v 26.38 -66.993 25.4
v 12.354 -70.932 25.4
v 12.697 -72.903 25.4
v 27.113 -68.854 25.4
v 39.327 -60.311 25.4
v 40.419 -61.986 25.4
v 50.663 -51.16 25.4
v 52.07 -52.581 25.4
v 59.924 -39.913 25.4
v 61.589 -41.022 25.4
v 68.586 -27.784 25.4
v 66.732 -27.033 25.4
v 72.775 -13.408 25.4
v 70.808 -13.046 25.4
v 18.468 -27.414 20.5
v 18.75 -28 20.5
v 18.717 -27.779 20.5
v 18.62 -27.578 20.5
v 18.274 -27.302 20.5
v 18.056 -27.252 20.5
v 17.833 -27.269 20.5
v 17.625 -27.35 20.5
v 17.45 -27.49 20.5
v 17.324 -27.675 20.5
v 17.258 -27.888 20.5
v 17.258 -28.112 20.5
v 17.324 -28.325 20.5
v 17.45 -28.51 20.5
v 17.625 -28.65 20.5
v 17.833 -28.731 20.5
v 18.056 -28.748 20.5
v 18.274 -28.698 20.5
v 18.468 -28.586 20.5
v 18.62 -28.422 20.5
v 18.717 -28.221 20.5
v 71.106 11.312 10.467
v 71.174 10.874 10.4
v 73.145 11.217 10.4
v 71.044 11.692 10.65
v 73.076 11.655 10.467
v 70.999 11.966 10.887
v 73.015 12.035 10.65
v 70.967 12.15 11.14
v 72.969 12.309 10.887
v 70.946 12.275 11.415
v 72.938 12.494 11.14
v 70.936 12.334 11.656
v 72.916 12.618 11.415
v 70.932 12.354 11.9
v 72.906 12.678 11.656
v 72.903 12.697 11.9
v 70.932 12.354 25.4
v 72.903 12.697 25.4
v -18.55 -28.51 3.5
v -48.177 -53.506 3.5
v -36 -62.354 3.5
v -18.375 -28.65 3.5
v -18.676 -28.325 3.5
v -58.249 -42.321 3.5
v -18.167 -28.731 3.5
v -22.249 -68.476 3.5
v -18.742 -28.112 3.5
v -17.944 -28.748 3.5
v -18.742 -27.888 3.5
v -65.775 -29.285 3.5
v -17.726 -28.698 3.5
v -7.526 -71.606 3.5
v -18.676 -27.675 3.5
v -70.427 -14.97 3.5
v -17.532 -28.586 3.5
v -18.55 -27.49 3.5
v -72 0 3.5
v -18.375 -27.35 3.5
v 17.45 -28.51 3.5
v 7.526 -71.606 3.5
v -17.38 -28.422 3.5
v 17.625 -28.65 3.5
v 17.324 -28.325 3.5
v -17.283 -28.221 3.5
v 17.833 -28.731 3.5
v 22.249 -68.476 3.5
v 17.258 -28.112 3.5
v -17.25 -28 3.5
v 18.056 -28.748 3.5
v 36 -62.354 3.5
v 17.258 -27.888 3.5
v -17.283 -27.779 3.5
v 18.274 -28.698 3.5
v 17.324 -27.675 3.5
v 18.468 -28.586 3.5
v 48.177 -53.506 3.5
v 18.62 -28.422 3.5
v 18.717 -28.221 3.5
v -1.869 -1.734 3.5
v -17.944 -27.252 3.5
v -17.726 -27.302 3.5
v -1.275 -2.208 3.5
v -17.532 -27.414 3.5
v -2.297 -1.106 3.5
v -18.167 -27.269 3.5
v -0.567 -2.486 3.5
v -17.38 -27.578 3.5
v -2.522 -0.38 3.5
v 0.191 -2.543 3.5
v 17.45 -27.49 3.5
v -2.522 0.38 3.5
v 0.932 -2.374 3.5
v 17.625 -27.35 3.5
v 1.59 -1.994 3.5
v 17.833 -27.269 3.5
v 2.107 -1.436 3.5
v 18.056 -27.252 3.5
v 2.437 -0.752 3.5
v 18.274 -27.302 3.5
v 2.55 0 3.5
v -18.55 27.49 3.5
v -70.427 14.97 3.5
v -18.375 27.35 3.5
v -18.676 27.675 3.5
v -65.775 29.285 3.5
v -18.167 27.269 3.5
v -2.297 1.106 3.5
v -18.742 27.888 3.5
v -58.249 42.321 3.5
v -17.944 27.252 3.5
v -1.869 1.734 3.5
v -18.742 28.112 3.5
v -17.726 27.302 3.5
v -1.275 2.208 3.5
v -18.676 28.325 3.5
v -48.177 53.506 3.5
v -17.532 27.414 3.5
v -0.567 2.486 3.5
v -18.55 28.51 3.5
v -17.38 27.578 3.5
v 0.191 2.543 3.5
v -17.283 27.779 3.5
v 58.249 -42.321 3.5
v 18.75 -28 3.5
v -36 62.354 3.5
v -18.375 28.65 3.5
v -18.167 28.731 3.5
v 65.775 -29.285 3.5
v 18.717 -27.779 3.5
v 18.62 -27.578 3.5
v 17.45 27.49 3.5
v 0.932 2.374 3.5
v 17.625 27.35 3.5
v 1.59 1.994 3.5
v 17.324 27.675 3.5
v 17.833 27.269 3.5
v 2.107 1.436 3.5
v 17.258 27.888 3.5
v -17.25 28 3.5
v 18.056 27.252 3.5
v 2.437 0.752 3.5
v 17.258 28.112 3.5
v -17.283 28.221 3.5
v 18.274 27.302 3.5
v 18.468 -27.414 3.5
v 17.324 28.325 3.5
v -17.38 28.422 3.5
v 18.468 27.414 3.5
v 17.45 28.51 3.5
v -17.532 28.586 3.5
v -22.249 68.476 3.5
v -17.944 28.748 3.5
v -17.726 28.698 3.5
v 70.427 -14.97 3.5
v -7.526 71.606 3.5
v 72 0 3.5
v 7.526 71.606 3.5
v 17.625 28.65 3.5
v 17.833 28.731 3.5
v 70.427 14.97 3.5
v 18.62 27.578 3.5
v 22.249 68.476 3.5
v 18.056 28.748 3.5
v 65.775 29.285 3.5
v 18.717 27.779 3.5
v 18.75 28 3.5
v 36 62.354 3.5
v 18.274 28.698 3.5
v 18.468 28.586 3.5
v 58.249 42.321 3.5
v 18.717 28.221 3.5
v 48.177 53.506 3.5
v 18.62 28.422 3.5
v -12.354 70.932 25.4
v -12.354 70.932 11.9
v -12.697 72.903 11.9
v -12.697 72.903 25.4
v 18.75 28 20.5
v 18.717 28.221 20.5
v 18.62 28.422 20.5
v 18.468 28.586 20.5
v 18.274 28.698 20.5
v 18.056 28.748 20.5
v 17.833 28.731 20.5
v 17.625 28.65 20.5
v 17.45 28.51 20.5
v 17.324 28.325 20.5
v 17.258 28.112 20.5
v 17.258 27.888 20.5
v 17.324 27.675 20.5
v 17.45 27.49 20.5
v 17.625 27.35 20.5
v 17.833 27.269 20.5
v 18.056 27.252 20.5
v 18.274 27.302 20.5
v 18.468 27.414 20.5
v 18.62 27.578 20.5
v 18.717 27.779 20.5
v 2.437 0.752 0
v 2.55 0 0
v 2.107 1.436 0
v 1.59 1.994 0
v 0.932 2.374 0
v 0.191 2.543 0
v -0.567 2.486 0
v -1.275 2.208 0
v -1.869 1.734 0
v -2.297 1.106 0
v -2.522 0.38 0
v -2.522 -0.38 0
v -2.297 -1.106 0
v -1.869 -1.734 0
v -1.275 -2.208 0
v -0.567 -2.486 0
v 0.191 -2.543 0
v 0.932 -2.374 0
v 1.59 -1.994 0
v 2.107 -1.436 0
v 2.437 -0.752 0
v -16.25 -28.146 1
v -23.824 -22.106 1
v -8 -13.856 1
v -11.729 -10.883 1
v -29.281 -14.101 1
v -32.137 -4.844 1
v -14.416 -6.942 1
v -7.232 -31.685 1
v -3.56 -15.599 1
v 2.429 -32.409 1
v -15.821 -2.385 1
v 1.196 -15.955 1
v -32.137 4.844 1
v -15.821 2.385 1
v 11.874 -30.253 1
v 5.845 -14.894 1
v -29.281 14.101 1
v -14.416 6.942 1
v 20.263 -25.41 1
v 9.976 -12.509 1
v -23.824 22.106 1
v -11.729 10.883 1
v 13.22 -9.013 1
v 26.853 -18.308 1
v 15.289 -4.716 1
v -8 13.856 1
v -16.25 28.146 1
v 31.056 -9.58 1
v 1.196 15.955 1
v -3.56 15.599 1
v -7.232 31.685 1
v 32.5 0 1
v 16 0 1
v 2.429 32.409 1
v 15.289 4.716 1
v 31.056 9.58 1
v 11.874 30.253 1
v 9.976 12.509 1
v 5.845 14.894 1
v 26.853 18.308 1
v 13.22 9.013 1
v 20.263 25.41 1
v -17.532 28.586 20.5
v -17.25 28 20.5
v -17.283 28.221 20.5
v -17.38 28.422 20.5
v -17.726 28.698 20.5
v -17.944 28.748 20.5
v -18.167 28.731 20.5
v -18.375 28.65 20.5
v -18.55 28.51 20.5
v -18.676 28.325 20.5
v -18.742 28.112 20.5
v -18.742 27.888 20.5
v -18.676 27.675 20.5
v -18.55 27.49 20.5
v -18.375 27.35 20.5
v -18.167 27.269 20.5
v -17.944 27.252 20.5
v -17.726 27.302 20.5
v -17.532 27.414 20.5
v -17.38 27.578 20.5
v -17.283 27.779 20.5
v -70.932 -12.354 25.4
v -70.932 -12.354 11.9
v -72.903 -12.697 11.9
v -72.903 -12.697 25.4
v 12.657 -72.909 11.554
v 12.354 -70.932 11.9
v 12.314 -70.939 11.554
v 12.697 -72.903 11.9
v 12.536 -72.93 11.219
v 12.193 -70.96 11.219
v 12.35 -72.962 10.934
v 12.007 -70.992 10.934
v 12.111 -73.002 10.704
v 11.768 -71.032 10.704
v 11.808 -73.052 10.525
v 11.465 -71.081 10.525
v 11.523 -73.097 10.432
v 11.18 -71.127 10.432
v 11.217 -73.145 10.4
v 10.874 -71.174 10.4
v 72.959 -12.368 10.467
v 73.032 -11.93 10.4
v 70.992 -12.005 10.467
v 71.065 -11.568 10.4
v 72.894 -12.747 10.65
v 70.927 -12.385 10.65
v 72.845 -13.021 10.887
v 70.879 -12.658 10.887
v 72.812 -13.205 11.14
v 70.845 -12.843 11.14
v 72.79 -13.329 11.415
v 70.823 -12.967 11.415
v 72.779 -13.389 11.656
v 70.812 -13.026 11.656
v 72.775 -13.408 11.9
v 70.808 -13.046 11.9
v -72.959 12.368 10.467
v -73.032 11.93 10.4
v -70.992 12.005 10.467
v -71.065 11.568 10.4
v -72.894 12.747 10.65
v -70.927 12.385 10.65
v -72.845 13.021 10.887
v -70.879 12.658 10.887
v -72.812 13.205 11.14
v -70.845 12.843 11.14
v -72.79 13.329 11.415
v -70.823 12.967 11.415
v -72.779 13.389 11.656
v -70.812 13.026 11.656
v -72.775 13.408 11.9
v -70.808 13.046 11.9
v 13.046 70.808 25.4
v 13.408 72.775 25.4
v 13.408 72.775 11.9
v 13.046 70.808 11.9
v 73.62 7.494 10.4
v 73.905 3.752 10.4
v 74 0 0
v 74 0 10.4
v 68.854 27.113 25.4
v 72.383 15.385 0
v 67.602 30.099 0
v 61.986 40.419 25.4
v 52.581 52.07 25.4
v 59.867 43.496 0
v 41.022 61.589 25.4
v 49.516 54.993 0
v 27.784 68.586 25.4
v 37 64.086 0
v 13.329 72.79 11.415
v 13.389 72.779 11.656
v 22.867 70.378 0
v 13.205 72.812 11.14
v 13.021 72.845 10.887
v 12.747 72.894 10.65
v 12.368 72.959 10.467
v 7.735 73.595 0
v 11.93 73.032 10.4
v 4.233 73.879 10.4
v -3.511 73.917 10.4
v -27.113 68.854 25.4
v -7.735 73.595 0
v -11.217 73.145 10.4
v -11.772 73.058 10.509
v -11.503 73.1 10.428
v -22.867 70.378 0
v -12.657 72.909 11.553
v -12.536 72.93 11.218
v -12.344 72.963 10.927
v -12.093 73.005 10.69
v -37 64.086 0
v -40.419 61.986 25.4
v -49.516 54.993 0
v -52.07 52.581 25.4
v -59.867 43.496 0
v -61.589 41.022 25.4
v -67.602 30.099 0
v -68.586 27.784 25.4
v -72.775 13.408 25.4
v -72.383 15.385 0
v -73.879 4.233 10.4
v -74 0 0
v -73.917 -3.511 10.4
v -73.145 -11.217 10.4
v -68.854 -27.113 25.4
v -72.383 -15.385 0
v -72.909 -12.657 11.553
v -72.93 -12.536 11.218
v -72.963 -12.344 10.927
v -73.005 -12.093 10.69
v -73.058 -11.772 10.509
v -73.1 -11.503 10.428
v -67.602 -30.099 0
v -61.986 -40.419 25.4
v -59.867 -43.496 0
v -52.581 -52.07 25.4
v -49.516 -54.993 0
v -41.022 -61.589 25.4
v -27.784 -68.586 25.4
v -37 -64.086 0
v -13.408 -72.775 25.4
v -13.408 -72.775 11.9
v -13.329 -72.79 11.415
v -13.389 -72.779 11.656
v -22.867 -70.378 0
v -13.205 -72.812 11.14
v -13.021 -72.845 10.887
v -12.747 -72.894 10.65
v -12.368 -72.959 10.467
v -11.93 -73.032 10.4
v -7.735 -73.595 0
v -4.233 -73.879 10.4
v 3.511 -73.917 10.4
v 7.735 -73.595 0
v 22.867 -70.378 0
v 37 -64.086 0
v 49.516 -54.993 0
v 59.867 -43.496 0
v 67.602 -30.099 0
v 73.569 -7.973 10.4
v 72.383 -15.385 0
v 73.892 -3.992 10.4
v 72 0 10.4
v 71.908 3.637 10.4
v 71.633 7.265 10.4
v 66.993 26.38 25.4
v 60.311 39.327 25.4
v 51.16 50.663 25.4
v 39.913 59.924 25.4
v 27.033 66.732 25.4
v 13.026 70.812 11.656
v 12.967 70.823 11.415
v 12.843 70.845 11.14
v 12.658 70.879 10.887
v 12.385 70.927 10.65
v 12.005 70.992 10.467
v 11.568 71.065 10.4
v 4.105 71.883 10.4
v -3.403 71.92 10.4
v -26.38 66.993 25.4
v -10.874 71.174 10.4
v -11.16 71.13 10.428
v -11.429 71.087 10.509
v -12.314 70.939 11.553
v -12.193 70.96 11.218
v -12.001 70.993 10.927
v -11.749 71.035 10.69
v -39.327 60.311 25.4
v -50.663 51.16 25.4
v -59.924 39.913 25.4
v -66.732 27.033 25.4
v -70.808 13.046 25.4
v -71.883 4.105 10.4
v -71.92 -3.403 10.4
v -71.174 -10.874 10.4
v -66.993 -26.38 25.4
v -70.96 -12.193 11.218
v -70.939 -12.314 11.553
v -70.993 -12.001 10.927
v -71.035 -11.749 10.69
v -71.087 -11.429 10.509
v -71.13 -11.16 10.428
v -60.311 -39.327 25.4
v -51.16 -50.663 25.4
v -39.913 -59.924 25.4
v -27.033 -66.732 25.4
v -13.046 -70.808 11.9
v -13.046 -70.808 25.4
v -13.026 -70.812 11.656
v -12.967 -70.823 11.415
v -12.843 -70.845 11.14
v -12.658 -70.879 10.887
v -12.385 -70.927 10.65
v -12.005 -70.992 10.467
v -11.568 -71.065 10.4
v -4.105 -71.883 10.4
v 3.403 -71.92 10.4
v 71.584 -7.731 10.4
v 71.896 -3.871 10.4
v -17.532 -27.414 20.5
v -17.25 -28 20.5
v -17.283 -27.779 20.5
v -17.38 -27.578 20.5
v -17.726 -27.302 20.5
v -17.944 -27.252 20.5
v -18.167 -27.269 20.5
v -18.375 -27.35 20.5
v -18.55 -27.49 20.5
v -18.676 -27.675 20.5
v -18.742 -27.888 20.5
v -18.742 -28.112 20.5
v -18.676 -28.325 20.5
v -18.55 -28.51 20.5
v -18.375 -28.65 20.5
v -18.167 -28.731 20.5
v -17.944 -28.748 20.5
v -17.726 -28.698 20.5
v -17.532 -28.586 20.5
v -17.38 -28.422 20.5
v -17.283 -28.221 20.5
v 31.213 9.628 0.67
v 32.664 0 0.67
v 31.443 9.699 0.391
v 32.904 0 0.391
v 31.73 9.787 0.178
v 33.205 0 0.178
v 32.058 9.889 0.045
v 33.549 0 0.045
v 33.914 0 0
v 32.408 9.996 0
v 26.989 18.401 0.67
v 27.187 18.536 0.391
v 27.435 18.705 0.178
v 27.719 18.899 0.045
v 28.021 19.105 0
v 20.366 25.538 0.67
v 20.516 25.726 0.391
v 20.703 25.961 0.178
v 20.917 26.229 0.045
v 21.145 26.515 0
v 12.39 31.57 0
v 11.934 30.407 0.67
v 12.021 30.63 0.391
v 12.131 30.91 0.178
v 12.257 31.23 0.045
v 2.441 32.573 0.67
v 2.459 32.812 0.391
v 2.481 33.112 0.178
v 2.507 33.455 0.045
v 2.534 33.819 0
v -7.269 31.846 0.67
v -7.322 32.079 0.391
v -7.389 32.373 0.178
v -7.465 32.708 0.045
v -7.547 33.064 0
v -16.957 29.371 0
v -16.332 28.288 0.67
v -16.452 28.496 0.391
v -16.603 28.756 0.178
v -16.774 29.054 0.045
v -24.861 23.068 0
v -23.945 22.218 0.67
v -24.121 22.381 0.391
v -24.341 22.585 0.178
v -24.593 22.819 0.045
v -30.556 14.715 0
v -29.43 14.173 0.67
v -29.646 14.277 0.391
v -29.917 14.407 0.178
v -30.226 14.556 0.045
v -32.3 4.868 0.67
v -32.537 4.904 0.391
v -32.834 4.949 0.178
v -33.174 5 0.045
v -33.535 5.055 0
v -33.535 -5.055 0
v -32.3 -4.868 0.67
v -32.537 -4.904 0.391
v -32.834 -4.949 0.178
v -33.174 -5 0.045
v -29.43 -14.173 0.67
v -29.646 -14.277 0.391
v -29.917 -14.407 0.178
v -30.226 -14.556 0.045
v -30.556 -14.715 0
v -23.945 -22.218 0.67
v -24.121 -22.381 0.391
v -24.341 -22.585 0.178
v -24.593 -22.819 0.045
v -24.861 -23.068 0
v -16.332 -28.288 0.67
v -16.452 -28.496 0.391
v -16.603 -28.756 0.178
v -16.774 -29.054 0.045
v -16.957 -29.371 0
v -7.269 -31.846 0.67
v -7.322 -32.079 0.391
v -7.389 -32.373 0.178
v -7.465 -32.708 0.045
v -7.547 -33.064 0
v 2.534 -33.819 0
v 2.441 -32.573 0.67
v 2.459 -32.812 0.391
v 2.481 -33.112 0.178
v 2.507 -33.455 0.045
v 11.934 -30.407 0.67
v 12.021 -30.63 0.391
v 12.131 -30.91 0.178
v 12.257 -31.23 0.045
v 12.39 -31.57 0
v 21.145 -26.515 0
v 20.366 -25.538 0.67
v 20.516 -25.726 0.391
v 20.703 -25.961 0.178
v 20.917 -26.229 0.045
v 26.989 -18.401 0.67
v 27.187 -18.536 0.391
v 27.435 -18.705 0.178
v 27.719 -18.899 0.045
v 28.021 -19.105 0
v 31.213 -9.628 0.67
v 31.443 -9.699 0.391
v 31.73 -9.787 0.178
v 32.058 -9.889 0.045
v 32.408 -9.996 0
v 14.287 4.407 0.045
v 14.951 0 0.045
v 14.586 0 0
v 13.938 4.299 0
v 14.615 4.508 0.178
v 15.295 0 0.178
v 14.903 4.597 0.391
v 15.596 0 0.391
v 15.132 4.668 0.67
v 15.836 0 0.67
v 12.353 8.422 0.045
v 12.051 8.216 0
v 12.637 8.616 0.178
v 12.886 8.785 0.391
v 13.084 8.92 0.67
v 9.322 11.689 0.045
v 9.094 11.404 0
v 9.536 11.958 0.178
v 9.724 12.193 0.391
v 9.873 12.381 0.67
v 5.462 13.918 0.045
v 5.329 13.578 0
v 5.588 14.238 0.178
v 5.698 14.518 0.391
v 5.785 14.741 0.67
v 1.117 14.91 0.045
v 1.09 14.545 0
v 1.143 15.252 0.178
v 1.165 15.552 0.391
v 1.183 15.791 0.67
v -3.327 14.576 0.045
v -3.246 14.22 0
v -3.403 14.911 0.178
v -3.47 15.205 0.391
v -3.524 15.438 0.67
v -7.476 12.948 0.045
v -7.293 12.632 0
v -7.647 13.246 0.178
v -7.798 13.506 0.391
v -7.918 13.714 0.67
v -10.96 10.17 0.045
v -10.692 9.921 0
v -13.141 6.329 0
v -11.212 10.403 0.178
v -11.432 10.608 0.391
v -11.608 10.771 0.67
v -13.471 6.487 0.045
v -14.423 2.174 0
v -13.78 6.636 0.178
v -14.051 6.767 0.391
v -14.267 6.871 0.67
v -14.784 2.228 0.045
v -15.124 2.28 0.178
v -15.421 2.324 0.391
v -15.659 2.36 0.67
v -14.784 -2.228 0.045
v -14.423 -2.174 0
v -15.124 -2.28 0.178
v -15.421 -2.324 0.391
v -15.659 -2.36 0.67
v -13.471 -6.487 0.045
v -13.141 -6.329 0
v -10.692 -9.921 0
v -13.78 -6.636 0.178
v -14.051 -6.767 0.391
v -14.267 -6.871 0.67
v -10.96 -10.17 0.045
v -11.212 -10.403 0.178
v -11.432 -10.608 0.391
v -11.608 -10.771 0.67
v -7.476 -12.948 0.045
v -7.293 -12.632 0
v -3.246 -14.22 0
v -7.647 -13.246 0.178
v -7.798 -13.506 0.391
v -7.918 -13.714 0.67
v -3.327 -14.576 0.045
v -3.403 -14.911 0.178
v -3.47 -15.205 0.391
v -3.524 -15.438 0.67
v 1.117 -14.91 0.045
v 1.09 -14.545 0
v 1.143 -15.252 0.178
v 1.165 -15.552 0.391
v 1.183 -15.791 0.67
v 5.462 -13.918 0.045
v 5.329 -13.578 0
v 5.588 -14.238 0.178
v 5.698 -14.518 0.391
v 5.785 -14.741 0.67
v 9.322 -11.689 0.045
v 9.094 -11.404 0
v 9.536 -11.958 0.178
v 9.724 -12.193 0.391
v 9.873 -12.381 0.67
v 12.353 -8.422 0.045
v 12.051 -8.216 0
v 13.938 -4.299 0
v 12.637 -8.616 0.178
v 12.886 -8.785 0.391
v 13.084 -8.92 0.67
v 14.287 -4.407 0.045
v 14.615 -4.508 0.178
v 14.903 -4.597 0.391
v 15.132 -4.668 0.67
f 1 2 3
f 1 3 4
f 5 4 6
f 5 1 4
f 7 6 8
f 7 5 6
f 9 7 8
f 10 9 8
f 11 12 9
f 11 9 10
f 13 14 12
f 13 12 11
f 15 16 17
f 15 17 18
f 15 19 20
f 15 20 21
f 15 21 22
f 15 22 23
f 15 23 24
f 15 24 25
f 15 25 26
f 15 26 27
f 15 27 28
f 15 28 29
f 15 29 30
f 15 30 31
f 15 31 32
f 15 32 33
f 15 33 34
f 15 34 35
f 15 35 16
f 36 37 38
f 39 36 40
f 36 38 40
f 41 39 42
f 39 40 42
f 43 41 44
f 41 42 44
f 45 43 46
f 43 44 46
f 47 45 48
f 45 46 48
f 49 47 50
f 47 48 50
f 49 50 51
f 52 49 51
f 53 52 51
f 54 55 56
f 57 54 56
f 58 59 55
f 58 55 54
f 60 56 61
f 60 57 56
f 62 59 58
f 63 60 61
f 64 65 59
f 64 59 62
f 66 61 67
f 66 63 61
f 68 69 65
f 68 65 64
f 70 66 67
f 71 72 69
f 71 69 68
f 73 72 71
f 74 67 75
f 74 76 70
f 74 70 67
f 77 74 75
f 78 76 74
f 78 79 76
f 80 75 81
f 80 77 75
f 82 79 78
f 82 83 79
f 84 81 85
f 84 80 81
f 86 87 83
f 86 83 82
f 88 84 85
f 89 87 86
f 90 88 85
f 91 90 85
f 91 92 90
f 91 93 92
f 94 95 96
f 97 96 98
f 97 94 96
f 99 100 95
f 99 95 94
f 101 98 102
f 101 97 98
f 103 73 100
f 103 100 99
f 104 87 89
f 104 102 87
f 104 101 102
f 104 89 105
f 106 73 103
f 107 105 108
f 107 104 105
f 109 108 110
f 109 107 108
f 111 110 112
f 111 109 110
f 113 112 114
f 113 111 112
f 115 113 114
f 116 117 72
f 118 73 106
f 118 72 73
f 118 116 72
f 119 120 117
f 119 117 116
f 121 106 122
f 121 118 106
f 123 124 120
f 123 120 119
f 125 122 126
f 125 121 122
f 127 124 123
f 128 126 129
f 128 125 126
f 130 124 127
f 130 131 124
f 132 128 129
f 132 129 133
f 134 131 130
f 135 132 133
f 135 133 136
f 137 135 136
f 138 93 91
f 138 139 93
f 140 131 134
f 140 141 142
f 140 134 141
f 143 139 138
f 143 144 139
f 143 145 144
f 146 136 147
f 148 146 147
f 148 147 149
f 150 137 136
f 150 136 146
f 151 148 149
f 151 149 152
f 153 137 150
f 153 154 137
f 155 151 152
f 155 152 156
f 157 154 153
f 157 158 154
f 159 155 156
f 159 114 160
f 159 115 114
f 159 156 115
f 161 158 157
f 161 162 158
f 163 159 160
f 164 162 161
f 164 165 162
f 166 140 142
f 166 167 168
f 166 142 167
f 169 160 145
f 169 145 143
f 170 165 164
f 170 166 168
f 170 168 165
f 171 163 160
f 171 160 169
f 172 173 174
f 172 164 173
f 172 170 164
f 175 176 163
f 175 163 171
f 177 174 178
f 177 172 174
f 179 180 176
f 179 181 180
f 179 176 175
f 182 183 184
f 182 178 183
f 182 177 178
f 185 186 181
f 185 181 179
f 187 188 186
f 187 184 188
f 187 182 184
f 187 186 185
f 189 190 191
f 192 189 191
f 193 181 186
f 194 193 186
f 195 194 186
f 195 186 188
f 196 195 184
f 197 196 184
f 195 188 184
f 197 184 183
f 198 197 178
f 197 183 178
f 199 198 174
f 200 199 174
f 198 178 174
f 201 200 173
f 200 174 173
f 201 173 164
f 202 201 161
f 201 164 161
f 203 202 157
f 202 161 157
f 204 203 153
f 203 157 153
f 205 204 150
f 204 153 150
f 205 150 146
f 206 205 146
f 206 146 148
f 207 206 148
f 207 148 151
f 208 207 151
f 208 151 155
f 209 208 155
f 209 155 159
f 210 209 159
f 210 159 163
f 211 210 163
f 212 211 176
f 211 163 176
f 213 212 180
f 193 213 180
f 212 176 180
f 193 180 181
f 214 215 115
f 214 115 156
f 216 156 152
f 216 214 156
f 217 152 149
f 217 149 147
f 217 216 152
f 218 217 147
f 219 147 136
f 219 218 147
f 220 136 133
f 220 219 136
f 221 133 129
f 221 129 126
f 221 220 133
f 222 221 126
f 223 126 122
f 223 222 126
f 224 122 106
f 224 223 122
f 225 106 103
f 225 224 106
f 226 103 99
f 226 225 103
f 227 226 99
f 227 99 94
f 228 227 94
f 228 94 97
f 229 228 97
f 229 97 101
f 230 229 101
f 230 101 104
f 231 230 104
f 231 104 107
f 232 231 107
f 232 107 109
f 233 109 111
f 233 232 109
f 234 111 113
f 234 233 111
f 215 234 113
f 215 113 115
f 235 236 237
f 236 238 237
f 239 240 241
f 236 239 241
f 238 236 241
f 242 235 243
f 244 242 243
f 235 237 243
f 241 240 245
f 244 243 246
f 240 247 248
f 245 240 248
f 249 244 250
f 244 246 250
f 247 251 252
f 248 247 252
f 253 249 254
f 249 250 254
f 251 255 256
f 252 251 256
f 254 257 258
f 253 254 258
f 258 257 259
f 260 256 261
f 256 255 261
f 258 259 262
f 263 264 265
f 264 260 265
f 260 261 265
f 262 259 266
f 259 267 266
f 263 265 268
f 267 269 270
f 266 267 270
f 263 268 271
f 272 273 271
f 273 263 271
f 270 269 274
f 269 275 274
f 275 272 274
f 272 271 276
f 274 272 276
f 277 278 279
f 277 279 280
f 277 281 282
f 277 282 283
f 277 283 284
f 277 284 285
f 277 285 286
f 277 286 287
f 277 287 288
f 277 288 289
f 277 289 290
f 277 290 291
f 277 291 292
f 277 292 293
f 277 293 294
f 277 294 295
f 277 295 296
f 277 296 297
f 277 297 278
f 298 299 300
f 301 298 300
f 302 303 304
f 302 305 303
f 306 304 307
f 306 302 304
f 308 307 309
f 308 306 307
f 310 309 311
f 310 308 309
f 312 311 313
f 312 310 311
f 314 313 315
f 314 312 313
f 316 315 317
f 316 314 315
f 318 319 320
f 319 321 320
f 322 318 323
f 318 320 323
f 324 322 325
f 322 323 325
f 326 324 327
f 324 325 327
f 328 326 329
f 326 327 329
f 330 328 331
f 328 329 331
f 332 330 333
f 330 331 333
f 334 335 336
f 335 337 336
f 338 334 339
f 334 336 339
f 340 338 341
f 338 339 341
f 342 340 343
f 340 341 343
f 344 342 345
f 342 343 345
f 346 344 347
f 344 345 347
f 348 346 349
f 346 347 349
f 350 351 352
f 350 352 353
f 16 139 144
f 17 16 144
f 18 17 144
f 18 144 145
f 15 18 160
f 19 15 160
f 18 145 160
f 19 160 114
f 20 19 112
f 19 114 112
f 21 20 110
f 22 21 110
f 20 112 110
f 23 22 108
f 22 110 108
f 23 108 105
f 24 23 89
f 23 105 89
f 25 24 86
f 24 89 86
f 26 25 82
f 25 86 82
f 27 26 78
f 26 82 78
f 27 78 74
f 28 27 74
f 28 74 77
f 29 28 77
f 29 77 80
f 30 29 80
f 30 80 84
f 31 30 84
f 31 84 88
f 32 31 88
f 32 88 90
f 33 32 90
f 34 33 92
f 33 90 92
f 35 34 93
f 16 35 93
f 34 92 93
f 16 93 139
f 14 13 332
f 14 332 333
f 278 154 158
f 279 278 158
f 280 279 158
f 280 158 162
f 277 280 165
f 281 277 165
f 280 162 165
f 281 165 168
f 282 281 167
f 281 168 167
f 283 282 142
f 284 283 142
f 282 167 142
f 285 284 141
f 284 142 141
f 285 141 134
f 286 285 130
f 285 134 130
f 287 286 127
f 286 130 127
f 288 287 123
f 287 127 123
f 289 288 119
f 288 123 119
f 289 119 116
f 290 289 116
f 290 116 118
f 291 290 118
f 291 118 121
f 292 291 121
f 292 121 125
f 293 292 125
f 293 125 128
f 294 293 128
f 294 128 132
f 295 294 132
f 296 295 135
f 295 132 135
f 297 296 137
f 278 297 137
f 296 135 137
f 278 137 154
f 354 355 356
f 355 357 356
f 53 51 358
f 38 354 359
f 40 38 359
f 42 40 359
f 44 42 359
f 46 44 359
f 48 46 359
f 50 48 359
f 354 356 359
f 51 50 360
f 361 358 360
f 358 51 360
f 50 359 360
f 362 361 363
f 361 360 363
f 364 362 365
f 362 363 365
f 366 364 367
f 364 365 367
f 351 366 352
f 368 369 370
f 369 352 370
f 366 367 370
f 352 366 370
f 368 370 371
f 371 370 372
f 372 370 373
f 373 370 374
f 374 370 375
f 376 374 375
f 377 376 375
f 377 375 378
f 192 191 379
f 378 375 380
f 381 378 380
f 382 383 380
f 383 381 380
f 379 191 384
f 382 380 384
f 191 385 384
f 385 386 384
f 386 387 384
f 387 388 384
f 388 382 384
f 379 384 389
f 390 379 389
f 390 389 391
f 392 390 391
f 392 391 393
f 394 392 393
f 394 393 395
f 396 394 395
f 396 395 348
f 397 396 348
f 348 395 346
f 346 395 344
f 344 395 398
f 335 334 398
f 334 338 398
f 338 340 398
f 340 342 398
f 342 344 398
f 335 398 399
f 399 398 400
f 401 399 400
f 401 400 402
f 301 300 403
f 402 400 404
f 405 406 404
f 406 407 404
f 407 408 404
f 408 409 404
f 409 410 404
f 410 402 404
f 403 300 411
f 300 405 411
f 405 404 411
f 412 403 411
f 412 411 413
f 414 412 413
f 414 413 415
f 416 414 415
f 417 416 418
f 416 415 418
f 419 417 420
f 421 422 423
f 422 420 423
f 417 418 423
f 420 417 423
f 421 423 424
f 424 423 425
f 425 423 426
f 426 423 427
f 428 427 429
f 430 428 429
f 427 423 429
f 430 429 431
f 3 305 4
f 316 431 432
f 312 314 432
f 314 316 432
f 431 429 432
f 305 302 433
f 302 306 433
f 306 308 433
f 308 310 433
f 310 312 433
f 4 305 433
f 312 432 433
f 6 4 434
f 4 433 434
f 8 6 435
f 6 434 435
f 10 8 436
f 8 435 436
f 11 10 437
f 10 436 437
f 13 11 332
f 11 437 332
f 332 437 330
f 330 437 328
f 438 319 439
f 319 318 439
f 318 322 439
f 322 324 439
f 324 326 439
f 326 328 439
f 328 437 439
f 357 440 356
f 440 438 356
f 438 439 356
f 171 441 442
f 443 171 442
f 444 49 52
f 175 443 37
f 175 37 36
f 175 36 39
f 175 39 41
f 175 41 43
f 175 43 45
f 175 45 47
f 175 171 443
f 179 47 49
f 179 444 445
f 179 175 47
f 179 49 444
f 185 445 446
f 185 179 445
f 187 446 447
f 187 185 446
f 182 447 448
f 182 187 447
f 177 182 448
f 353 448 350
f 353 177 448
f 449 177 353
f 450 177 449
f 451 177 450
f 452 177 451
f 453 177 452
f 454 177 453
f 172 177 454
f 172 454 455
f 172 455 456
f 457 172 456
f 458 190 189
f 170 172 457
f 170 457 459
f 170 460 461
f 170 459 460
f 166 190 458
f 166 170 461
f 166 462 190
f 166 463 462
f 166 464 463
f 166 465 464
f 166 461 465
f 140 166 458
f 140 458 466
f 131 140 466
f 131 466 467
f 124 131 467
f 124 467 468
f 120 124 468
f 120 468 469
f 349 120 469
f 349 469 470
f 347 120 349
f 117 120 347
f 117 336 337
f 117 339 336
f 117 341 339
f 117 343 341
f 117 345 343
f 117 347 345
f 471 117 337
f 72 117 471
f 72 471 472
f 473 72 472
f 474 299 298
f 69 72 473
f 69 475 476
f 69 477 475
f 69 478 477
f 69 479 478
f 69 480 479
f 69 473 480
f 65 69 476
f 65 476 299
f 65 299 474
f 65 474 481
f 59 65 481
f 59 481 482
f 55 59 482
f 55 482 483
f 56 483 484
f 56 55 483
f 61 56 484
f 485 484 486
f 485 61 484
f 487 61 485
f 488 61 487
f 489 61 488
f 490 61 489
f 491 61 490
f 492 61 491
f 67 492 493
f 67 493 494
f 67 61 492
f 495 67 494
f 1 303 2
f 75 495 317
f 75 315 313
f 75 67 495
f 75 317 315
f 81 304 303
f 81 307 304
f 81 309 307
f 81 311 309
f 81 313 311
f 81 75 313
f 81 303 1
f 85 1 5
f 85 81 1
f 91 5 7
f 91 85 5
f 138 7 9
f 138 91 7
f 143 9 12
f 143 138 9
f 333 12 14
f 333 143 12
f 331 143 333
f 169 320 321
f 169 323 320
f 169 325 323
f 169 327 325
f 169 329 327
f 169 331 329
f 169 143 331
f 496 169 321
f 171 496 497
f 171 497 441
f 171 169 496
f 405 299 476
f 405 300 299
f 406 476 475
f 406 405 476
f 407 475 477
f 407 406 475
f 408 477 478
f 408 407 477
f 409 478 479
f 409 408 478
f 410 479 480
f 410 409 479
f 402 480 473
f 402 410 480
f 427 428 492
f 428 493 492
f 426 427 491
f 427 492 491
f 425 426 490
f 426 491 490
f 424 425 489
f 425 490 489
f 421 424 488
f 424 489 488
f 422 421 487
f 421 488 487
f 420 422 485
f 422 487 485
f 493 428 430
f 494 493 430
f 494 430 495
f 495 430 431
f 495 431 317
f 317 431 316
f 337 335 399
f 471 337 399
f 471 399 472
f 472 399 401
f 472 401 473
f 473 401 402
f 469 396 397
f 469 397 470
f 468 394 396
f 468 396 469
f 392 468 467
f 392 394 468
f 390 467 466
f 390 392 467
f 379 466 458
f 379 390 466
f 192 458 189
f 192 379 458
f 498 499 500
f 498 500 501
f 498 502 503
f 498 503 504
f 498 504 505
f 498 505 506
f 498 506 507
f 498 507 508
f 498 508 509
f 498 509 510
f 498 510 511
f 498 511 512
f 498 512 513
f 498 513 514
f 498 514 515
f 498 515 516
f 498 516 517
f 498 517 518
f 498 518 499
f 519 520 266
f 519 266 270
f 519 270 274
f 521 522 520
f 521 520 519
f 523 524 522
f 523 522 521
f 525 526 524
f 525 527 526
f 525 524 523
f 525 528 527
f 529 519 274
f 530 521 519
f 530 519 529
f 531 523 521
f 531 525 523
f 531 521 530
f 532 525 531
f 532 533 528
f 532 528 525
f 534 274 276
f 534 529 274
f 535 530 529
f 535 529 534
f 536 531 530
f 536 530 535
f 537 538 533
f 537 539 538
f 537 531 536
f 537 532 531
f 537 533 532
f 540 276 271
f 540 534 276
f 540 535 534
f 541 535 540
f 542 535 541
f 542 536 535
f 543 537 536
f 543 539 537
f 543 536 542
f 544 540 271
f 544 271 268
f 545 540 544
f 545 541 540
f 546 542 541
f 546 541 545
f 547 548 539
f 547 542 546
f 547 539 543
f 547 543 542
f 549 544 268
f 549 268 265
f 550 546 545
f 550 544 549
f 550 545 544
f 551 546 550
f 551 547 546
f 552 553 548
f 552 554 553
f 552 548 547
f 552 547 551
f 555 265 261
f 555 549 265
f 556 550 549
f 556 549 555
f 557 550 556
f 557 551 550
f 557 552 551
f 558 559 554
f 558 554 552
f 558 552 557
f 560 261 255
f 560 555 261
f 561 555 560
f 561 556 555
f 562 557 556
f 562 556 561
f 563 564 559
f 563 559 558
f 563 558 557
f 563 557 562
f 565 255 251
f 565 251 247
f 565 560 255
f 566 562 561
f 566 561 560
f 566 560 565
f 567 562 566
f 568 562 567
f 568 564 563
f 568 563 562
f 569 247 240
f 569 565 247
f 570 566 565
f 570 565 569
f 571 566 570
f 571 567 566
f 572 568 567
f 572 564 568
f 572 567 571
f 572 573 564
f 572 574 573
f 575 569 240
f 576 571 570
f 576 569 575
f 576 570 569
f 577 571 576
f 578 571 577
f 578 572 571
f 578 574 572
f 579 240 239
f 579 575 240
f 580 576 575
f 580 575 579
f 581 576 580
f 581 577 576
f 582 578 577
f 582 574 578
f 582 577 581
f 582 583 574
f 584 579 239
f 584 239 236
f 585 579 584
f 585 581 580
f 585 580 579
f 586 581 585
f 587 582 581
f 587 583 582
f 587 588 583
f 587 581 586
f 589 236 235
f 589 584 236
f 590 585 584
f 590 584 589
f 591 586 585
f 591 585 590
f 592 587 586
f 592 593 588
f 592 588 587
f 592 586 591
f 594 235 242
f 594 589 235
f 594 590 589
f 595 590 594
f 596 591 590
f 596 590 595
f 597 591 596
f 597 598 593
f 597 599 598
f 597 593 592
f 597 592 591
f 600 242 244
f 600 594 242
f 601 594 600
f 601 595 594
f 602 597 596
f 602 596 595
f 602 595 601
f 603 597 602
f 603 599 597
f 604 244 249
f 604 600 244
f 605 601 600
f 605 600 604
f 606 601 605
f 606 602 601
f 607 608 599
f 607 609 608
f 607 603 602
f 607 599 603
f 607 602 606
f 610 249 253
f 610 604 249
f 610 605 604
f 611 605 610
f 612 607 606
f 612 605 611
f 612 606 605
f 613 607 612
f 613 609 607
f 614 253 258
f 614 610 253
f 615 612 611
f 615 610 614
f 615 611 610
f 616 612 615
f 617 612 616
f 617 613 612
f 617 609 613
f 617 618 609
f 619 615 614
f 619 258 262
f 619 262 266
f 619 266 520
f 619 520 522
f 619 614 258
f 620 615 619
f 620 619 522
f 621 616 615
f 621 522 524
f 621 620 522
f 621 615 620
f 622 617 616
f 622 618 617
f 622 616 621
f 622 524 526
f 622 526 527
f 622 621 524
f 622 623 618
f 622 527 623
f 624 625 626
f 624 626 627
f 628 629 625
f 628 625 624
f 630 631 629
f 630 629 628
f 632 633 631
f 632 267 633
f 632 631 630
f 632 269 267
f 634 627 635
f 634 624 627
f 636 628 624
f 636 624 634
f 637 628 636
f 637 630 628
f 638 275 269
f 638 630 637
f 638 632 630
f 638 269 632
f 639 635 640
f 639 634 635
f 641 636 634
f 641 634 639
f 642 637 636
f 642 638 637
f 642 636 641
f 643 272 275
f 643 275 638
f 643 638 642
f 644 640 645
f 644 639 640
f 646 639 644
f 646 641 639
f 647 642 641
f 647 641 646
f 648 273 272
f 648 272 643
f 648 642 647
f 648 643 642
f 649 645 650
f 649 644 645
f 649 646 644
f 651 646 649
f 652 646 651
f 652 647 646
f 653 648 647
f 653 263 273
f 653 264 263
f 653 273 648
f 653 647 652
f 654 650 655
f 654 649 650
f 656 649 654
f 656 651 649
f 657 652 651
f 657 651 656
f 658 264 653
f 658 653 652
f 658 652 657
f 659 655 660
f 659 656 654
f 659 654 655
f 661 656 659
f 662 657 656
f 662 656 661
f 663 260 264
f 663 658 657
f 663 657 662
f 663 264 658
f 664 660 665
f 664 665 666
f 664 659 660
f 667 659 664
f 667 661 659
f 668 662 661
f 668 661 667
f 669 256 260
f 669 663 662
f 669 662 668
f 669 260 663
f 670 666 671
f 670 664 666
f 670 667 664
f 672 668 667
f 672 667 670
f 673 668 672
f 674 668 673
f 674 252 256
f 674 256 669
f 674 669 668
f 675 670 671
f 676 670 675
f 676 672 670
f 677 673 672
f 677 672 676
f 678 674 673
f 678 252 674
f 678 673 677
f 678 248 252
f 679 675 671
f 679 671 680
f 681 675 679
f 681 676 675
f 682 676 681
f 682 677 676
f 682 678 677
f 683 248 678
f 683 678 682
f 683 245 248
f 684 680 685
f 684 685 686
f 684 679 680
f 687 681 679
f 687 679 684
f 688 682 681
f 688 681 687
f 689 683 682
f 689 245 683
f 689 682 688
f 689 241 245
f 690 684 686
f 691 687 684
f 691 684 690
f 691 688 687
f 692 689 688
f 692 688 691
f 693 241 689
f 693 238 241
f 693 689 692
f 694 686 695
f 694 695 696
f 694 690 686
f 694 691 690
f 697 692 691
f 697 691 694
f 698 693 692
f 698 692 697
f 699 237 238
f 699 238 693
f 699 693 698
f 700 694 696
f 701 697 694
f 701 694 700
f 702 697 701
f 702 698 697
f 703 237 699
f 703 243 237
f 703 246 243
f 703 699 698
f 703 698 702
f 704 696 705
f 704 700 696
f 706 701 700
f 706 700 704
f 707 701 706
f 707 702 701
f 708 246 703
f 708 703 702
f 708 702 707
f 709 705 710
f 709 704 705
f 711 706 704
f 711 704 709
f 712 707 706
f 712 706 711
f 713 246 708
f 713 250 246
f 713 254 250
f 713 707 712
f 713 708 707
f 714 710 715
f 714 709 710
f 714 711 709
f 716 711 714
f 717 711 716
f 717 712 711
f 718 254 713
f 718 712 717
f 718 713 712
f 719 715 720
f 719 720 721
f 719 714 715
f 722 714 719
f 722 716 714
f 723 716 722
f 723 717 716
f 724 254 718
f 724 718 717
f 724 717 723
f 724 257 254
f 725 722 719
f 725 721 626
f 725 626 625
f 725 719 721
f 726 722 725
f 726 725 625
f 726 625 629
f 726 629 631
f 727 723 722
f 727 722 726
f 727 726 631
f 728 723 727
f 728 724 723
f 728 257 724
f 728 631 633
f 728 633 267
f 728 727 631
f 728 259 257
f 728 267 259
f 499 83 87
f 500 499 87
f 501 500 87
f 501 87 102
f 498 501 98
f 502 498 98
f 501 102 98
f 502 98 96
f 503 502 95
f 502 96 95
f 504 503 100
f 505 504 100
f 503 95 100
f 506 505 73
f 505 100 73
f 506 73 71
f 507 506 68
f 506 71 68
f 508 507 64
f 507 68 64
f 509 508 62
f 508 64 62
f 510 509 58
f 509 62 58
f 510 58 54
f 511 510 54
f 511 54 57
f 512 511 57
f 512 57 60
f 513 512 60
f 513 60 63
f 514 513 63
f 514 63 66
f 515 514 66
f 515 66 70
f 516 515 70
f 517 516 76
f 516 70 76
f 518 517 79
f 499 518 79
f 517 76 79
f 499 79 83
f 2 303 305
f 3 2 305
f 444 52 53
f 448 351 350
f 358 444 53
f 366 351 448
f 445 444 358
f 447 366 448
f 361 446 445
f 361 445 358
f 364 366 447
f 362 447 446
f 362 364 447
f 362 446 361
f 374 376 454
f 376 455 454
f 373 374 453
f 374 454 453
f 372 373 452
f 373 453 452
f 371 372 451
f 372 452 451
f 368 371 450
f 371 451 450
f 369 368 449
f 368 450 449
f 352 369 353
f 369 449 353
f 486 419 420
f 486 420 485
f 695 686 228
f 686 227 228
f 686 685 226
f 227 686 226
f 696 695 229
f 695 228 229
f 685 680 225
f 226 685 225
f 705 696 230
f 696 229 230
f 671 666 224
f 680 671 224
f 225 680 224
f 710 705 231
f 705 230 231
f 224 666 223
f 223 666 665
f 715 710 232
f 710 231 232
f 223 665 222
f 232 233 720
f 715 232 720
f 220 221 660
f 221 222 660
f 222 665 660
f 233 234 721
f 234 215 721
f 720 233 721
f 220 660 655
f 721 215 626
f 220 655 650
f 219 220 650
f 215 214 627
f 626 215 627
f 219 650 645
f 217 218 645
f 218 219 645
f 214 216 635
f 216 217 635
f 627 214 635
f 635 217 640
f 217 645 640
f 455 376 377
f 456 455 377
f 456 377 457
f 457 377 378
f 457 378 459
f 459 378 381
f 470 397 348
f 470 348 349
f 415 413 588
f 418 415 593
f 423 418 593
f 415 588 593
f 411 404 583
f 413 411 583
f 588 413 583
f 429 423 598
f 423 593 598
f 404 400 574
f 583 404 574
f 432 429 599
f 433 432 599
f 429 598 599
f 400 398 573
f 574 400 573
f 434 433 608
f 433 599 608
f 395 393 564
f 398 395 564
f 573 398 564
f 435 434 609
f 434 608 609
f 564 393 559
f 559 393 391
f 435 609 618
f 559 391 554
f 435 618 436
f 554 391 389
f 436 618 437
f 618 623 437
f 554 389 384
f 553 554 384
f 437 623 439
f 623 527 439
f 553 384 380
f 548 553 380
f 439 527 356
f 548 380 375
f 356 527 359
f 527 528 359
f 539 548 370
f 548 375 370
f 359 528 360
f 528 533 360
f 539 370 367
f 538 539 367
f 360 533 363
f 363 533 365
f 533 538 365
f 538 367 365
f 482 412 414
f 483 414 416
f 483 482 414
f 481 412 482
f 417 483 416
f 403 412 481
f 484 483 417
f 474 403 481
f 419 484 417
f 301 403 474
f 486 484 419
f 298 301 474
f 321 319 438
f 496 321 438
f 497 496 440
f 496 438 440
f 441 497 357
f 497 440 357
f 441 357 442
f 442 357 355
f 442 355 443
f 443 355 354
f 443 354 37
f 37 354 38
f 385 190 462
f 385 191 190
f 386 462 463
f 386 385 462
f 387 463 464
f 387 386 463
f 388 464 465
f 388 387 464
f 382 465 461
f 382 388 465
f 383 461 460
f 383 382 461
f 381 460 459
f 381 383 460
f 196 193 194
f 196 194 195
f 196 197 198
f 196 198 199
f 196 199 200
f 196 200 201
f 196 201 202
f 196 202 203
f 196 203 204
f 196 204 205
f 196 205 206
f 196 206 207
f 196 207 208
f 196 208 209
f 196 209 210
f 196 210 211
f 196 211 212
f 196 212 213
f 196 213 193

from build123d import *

# Parameters (mm, degrees)
SKETCH1_R           = 74
SKETCH1_R_2         = 2.55
BOSS_EXTRUDE1_DEPTH = 3.5
SKETCH2_R           = 32.5
SKETCH2_R_2         = 16
CUT_EXTRUDE4_DEPTH  = 1
FILLET1_R           = 1.5
FILLET2_R           = 1.5
SKETCH3_R           = 74
SKETCH3_R_2         = 72
BOSS_EXTRUDE2_DEPTH = 25.4
CUT_EXTRUDE5_START  = -15
CUT_EXTRUDE5_DEPTH  = 15
CIRPATTERN2_COUNT   = 4
FILLET4_R           = 1.5
SKETCH6_R           = 0.75
BOSS_EXTRUDE3_DEPTH = 17


with BuildPart() as part:
    # Sketch1 → Boss-Extrude1 (new body)
    with BuildSketch(Plane.XY):
        Circle(SKETCH1_R)
        Circle(SKETCH1_R_2, mode=Mode.SUBTRACT)
    extrude(amount=BOSS_EXTRUDE1_DEPTH)

    # Sketch2 → Cut-Extrude4 (cut)
    with BuildSketch(Plane.XY):
        Circle(SKETCH2_R)
        Circle(SKETCH2_R_2, mode=Mode.SUBTRACT)
    extrude(amount=CUT_EXTRUDE4_DEPTH, mode=Mode.SUBTRACT)

    # Fillet1
    # the kernel refuses this fillet: 1.5 mm, written as the material it takes off along each edge
    with BuildSketch(Plane(origin=(0, 0, 0), x_dir=(1, 0, 0), z_dir=(0, -1, 0))) as fillet1_piece_1:
        with BuildLine():
            CenterArc((33.914213562, 1.5), FILLET1_R, 199.471220634, 70.528779366)
            Line((32.5, 1), (32.471715729, 0.99))
            ThreePointArc((32.471715729, 0.99), (32.47, 0.5), (32.47, 0))
            Line((32.47, 0), (32.5, -0.03))
            Line((32.5, -0.03), (33.914213562, -0.03))
            Line((33.914213562, -0.03), (33.914213562, 0))
        make_face()
    revolve(axis=Axis((0, 0, 0), (0, 0, 1)), mode=Mode.SUBTRACT)

    # Fillet2
    # the kernel refuses this fillet: 1.5 mm, written as the material it takes off along each edge
    with BuildSketch(Plane(origin=(0, 0, 0), x_dir=(1, 0, 0), z_dir=(0, -1, 0))) as fillet2_piece_1:
        with BuildLine():
            CenterArc((14.585786438, 1.5), FILLET2_R, 270, 70.528779366)
            Line((16, 1), (16.028284271, 0.99))
            ThreePointArc((16.028284271, 0.99), (16.03, 0.5), (16.03, 0))
            Line((16.03, 0), (16, -0.03))
            Line((16, -0.03), (14.585786438, -0.03))
            Line((14.585786438, -0.03), (14.585786438, 0))
        make_face()
    revolve(axis=Axis((0, 0, 0), (0, 0, 1)), mode=Mode.SUBTRACT)

    # Sketch3 → Boss-Extrude2 (add)
    with BuildSketch(Plane.XY):
        Circle(SKETCH3_R)
        Circle(SKETCH3_R_2, mode=Mode.SUBTRACT)
    extrude(amount=BOSS_EXTRUDE2_DEPTH)

    # Sketch5 → Cut-Extrude5 (cut)
    with BuildSketch(Plane.XY.offset(25.4).offset(CUT_EXTRUDE5_START)):
        with BuildLine():
            Line((-12.354120349, 70.932190932), (-12.697290359, 72.902529569))
            ThreePointArc((-12.697290359, 72.902529569), (0.361150189, 73.999118715), (13.408265197, 72.775122291))
            Line((13.408265197, 72.775122291), (13.045879651, 70.808227094))
            ThreePointArc((13.045879651, 70.808227094), (0.351389373, 71.999142533), (-12.354120349, 70.932190932))
        make_face()
    cut_extrude5 = extrude(amount=CUT_EXTRUDE5_DEPTH, mode=Mode.SUBTRACT)

    # CirPattern2: Cut-Extrude5 ×4 about axis
    cirpattern2_axis = Axis((0, 0, 0), (0, 0, -1))
    for i in range(1, CIRPATTERN2_COUNT):
        add(cut_extrude5.rotate(cirpattern2_axis, i * 360 / CIRPATTERN2_COUNT), mode=Mode.SUBTRACT)

    # Fillet4
    fillet4_edges = [part.edges().sort_by_distance(p)[0] for p in [
        (13.227072424, 71.791674692, 10.4),
        (-12.525705354, 71.91736025, 10.4),
        (-71.791674692, 13.227072424, 10.4),
        (-71.91736025, -12.525705354, 10.4),
        (-13.227072424, -71.791674692, 10.4),
        (12.525705354, -71.91736025, 10.4),
        (71.791674692, -13.227072424, 10.4),
        (71.91736025, 12.525705354, 10.4),
    ]]
    fillet(fillet4_edges, radius=FILLET4_R)

    # Sketch6 → Boss-Extrude3 (add)
    with BuildSketch(Plane.XY.offset(3.5)):
        with Locations((18, 28)):
            Circle(SKETCH6_R)
        with Locations((-18, 28)):
            Circle(SKETCH6_R)
        with Locations((-18, -28)):
            Circle(SKETCH6_R)
        with Locations((18, -28)):
            Circle(SKETCH6_R)
    extrude(amount=BOSS_EXTRUDE3_DEPTH)


solid = part.part
